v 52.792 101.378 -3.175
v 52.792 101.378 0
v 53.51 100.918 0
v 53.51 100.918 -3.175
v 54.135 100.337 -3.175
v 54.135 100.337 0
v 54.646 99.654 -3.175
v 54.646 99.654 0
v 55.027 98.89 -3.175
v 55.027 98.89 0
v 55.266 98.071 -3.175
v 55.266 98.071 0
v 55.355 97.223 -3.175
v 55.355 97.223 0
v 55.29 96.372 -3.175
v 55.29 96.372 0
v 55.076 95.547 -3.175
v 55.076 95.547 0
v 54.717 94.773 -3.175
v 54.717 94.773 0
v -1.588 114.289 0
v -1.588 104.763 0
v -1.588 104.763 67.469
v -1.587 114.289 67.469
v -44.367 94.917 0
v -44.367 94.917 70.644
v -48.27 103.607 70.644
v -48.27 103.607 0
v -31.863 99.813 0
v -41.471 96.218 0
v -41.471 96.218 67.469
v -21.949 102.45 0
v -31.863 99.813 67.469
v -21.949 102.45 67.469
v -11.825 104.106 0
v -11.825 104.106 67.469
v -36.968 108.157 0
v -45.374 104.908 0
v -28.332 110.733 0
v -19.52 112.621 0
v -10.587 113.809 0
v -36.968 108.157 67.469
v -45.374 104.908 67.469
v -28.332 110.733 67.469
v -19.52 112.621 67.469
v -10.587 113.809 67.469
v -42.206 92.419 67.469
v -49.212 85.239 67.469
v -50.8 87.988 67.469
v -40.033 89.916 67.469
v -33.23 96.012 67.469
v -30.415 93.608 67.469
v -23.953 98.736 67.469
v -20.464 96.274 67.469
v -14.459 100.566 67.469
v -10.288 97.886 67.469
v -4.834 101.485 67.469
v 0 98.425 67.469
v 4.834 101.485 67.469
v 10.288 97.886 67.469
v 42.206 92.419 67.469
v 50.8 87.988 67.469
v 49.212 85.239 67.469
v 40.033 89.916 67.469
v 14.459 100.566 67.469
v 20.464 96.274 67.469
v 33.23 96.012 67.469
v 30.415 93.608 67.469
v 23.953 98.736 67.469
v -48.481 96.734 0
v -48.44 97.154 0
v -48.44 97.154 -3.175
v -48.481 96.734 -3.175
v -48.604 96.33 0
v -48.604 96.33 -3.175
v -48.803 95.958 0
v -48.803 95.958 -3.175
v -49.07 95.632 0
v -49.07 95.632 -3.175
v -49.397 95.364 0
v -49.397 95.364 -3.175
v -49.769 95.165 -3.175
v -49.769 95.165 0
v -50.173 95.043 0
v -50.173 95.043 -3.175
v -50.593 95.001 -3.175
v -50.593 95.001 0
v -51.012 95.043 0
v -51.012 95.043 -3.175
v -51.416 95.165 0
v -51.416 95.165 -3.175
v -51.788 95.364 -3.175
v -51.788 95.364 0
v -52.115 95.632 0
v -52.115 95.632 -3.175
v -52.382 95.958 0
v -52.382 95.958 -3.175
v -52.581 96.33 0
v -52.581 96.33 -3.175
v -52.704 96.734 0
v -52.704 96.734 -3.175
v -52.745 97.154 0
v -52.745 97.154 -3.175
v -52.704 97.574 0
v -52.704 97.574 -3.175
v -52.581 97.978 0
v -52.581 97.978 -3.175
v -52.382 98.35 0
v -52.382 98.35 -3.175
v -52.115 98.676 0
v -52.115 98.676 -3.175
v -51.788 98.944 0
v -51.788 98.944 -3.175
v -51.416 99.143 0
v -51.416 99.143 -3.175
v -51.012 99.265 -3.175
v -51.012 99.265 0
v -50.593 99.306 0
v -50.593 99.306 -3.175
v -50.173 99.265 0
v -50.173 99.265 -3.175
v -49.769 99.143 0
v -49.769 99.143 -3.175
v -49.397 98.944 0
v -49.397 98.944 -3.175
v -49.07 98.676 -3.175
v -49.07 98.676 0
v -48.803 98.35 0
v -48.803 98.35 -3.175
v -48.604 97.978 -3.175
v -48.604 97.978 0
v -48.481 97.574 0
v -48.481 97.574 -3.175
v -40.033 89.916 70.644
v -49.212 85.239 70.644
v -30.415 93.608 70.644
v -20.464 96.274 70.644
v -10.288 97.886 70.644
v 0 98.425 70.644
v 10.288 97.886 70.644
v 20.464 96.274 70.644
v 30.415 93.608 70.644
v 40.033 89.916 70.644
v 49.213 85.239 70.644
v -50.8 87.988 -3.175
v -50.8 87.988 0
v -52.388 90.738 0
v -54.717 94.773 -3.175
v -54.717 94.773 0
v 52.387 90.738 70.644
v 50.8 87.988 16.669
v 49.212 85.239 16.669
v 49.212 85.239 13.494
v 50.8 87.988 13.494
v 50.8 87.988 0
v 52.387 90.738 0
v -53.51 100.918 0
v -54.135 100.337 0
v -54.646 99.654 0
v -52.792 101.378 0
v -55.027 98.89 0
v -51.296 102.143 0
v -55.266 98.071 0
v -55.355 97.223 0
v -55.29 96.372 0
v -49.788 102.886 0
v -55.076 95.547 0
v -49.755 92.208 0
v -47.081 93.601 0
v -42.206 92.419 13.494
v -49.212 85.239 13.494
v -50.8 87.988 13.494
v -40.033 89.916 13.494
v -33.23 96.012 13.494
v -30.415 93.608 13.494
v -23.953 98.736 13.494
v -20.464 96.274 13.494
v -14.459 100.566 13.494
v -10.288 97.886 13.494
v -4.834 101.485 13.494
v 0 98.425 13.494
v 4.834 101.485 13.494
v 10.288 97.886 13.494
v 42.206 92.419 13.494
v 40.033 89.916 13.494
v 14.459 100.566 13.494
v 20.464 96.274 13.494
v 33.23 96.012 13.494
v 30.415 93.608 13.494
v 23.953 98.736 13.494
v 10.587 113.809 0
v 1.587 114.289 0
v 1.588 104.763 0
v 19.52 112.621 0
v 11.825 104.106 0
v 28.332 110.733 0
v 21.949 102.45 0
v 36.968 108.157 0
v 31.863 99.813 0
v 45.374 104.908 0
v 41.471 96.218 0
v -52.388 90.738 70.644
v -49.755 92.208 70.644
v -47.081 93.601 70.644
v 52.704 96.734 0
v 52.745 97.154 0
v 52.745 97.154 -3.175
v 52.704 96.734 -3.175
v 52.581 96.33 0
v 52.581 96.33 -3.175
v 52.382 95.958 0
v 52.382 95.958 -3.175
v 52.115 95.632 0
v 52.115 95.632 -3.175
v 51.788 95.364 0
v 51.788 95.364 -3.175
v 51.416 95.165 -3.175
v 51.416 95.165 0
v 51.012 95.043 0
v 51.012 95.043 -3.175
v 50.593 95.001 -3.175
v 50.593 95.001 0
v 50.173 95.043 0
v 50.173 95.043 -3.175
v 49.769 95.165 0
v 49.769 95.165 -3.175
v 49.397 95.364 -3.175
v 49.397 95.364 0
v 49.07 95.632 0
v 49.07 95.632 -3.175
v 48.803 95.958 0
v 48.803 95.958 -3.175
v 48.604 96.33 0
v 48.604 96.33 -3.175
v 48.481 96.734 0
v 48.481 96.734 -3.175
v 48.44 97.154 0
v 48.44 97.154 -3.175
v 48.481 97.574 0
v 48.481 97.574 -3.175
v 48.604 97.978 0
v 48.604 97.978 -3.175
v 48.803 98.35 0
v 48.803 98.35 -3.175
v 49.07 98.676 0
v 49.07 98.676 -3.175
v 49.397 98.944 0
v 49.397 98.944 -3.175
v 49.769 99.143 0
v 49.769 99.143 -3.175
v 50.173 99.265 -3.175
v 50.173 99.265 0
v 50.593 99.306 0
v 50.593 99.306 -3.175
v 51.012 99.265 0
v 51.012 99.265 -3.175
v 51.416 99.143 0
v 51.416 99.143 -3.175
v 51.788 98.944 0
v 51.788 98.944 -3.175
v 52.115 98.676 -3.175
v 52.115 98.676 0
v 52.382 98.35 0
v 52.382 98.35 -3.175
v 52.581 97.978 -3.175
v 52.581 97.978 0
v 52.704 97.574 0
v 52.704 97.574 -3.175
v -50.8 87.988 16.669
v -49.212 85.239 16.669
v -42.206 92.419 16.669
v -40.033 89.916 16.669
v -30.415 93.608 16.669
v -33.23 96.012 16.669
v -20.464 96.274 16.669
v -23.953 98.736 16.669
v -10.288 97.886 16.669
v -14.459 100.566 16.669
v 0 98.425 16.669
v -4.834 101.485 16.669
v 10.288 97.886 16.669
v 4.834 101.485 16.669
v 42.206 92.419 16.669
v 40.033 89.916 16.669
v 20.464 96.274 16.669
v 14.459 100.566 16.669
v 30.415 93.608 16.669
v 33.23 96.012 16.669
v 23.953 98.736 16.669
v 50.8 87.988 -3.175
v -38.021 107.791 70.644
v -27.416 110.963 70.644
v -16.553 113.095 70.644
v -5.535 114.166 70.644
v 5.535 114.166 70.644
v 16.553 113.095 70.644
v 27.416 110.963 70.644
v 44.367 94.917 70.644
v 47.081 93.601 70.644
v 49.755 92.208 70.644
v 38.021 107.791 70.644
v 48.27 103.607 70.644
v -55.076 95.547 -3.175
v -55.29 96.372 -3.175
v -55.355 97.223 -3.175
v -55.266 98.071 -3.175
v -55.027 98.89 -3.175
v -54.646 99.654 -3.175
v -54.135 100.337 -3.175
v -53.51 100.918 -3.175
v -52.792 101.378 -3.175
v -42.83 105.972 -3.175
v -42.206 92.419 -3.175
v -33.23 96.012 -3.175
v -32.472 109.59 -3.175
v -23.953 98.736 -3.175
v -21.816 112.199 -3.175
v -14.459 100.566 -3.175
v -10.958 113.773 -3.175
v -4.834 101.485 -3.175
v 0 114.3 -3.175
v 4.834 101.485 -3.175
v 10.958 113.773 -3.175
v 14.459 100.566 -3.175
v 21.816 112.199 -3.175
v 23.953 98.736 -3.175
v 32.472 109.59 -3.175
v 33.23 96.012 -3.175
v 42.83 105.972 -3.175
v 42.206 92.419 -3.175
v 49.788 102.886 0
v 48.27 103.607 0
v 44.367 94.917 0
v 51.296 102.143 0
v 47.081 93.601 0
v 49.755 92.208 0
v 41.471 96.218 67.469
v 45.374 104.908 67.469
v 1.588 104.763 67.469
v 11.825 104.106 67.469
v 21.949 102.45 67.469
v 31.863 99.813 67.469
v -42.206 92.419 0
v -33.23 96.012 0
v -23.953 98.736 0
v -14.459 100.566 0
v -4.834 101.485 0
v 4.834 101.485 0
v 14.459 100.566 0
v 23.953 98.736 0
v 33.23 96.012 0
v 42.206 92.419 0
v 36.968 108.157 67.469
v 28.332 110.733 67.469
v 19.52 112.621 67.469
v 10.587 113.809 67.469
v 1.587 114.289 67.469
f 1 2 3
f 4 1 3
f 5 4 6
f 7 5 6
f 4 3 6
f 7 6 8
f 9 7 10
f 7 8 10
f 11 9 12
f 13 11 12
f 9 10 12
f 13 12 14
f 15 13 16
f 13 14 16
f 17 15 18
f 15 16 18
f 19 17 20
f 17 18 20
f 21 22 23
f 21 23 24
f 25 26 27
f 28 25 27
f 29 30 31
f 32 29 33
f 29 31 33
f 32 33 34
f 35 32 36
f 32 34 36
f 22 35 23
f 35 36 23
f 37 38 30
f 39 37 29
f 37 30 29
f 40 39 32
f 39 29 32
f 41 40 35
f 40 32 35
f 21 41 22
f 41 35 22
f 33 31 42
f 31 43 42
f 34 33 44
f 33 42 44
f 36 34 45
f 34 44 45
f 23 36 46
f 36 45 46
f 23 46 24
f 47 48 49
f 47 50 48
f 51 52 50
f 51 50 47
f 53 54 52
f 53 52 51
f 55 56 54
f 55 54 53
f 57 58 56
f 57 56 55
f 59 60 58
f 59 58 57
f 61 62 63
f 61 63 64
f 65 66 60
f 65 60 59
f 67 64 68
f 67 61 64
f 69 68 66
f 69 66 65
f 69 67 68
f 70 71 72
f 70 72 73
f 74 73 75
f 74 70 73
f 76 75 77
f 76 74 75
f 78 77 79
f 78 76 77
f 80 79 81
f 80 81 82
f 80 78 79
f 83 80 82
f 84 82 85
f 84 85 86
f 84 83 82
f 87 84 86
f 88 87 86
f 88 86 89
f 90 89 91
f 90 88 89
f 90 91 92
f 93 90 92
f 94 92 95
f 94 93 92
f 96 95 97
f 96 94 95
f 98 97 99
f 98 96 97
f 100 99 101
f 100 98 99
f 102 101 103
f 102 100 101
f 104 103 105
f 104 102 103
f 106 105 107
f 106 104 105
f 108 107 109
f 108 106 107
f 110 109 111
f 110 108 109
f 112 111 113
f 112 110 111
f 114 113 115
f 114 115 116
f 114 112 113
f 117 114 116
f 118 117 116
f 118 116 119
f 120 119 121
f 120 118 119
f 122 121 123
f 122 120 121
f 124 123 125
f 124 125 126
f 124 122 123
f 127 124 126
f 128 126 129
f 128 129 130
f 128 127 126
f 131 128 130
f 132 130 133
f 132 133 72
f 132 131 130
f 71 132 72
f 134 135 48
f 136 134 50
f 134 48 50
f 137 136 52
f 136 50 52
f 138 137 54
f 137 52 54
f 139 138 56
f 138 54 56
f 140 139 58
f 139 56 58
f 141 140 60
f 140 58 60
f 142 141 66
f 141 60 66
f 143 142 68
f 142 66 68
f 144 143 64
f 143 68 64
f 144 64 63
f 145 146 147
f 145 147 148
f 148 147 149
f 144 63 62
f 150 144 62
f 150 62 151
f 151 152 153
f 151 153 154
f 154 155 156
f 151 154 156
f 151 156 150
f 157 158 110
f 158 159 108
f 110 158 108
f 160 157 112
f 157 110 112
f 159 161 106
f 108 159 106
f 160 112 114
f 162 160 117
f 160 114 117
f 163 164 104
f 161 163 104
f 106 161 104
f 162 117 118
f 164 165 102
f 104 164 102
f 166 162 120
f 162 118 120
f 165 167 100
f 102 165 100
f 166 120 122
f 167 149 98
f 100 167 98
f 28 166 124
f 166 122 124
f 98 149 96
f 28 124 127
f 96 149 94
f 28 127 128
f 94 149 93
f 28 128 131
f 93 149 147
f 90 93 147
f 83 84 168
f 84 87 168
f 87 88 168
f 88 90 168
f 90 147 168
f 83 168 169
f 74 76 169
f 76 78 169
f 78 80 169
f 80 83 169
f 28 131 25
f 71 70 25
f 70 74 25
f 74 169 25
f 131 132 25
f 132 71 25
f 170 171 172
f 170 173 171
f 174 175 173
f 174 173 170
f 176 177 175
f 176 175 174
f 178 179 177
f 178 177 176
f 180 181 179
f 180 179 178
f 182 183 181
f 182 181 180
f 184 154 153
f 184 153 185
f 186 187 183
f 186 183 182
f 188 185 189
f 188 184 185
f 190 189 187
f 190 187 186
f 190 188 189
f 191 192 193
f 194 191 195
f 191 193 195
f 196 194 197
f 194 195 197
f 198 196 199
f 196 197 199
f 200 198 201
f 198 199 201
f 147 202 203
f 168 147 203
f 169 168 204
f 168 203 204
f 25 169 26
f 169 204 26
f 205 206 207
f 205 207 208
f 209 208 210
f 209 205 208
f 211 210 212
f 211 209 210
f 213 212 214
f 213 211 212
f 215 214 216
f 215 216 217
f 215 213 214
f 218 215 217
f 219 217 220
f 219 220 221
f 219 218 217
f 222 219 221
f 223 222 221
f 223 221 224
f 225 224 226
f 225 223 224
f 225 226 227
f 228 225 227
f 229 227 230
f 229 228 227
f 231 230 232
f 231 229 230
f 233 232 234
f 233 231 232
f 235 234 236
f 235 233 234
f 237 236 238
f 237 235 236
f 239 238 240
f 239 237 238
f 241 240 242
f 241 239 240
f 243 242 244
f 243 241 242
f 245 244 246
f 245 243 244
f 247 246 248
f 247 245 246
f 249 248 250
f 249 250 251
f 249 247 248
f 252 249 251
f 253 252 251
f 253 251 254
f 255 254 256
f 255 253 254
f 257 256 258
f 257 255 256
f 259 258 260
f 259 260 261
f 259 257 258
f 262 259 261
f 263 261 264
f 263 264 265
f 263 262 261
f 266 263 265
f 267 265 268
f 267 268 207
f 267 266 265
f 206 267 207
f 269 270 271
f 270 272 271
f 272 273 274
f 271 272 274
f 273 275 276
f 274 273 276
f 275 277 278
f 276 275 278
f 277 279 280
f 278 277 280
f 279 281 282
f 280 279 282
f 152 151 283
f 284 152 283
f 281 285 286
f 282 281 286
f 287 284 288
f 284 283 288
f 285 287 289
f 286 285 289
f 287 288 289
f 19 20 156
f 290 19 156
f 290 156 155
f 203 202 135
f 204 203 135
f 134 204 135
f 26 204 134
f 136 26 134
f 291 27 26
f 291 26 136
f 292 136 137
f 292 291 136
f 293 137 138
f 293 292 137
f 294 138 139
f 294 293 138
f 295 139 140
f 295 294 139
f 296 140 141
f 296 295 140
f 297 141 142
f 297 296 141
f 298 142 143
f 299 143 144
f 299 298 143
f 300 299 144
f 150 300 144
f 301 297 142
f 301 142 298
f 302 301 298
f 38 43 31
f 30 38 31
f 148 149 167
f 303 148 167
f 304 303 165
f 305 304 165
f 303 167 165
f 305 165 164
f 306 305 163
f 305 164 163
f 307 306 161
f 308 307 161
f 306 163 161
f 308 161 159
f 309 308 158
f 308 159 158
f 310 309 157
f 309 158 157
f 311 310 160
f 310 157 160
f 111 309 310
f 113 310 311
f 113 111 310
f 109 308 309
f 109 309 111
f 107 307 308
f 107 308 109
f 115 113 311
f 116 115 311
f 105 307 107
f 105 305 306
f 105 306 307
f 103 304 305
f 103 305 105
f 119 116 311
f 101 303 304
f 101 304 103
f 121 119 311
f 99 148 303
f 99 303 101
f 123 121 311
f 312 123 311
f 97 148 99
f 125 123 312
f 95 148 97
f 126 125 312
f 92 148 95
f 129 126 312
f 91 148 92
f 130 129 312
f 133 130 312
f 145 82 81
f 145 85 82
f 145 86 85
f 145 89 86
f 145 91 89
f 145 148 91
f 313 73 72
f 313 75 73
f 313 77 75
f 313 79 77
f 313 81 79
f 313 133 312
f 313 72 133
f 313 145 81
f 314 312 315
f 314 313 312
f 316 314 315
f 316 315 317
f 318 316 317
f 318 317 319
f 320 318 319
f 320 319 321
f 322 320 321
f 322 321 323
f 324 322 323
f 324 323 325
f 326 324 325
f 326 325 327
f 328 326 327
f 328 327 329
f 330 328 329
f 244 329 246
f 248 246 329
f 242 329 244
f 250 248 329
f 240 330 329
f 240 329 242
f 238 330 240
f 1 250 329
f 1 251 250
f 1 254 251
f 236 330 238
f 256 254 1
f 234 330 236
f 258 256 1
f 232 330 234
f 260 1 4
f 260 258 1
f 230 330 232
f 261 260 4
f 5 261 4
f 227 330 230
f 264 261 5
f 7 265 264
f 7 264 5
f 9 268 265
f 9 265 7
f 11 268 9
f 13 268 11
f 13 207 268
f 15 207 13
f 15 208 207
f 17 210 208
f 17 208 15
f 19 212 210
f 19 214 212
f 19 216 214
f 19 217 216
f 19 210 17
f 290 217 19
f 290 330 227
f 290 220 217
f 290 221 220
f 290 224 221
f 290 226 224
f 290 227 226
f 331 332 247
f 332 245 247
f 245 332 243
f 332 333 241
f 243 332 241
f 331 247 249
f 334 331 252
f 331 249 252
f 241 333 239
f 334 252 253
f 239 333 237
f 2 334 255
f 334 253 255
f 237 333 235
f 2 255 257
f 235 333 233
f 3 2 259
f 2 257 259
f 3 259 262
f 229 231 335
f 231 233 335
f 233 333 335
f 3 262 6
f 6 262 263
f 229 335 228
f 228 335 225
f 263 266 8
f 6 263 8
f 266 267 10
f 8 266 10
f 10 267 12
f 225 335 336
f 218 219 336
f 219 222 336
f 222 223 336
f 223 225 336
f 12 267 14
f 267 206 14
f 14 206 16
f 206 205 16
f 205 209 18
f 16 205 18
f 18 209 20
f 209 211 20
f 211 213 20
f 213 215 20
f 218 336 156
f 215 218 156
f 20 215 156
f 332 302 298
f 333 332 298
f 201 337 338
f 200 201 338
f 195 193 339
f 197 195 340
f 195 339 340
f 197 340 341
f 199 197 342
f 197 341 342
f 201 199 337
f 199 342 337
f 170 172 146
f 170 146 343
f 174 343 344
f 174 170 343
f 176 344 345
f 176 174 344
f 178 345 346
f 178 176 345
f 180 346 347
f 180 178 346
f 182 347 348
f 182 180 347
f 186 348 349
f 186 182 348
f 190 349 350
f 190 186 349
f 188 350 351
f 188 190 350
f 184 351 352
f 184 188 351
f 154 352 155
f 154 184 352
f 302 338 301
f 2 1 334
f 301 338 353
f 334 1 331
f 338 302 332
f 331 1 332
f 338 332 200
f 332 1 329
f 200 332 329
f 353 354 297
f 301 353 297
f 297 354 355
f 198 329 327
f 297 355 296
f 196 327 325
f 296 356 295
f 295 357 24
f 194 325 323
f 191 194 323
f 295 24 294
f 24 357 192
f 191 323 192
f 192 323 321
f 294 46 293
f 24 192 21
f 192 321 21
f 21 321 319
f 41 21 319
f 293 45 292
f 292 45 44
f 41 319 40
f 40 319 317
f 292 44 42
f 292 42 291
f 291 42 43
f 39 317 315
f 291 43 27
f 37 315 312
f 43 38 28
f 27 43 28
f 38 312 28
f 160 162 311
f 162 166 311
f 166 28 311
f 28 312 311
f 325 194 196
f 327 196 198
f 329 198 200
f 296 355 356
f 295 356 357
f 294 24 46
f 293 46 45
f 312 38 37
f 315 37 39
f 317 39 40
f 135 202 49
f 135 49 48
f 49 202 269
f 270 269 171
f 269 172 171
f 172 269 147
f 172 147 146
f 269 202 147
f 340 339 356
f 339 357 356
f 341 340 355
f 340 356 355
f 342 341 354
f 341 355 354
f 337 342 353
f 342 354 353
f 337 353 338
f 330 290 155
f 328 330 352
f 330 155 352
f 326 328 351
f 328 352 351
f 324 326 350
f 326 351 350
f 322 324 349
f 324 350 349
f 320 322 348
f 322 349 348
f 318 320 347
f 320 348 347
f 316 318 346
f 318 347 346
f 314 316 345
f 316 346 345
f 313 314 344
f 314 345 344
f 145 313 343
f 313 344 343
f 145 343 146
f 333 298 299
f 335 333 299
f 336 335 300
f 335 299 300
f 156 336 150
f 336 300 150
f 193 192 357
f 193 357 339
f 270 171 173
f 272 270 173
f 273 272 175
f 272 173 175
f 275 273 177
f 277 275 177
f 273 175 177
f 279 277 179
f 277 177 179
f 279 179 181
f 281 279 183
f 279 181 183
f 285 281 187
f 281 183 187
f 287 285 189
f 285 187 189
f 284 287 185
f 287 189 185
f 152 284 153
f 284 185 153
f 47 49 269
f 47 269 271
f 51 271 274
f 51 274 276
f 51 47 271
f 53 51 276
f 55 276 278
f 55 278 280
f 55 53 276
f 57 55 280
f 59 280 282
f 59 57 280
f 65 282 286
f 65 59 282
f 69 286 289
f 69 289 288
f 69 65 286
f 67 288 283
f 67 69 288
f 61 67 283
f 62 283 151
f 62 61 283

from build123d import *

# Parameters (mm, degrees)
F1_DEPTH = 70.64375
F2_W     = 3.175
F2_H     = 50.8
F2_H_2   = 13.49375
F5_DEPTH = 70.64375
F6_R     = 2.15265
F7_DEPTH = 3.175
F9_DEPTH = 3.175


with BuildPart() as f1:
    # F0 (on Top) → F1 (new body)
    with BuildSketch(Plane.XY):
        with BuildLine():
            ThreePointArc((-49.2125, 85.2385503675), (0, 98.425), (49.2125, 85.2385503675))
            Line((49.2125, 85.2385503675), (57.15, 98.9867036526))
            ThreePointArc((57.15, 98.9867036526), (0, 114.3), (-57.15, 98.9867036526))
            Line((-57.15, 98.9867036526), (-49.2125, 85.2385503675))
        make_face()
    extrude(amount=F1_DEPTH)

    # F2 (on face) → F3 (revolve, cut)
    with BuildSketch(Plane(origin=(0, 0, 0), x_dir=(0.5, -0.8660254038, 0), z_dir=(-0.8660254038, -0.5, 0))):
        with Locations((-100.0125, 42.06875)):
            Rectangle(F2_W, F2_H)
        with Locations((-100.0125, 6.746875)):
            Rectangle(F2_W, F2_H_2)
    revolve(axis=Axis((0, 0, 0), (0, 0, -1)), mode=Mode.SUBTRACT)

    # F4 (on face) → F5 (cut, through all)
    with BuildSketch(Plane.XY.offset(70.64375)):
        with BuildLine():
            ThreePointArc((-48.2700740152, 103.6073836875), (-52.7606451092, 101.3943012583), (-57.15, 98.9867036526))
            Line((-57.15, 98.9867036526), (-52.3875, 90.7378116815))
            ThreePointArc((-52.3875, 90.7378116815), (-48.4225984878, 92.9142216277), (-44.3674611423, 94.9174853059))
            Line((-44.3674611423, 94.9174853059), (-48.2700740152, 103.6073836875))
        make_face()
        with BuildLine():
            Line((-45.3737460178, 104.9081177617), (-41.4711331449, 96.2182193801))
            ThreePointArc((-41.4711331449, 96.2182193801), (-21.9491383614, 102.4501632512), (-1.5875, 104.7629727945))
            Line((-1.5875, 104.7629727945), (-1.5875, 114.2889751627))
            ThreePointArc((-1.5875, 114.2889751627), (-23.944514576, 111.7638144558), (-45.3737460178, 104.9081177617))
        make_face()
        with BuildLine():
            Line((1.5875, 114.2889751627), (1.5875, 104.7629727945))
            ThreePointArc((1.5875, 104.7629727945), (21.9491383614, 102.4501632512), (41.4711331449, 96.2182193801))
            Line((41.4711331449, 96.2182193801), (45.3737460178, 104.9081177617))
            ThreePointArc((45.3737460178, 104.9081177617), (23.944514576, 111.7638144558), (1.5875, 114.2889751627))
        make_face()
        with BuildLine():
            ThreePointArc((44.3674611423, 94.9174853059), (48.4225984878, 92.9142216277), (52.3875, 90.7378116815))
            Line((52.3875, 90.7378116815), (57.15, 98.9867036526))
            ThreePointArc((57.15, 98.9867036526), (52.7606451092, 101.3943012583), (48.2700740152, 103.6073836875))
            Line((48.2700740152, 103.6073836875), (44.3674611423, 94.9174853059))
        make_face()
    extrude(amount=-F5_DEPTH, mode=Mode.SUBTRACT)

    # F6 (on face) → F7 (join)
    with BuildSketch(Plane(origin=(0, 0, 0), x_dir=(1, 0, 0), z_dir=(0, 0, -1))):
        with BuildLine():
            ThreePointArc((50.8, -87.9881810245), (0, -101.6), (-50.8, -87.9881810245))
            Line((-50.8, -87.9881810245), (-54.7169592083, -94.7725533844))
            ThreePointArc((-54.7169592083, -94.7725533844), (-55.1648447708, -98.4861661221), (-52.7921877107, -101.3778817924))
            ThreePointArc((-52.7921877107, -101.3778817924), (0, -114.3), (52.7921877107, -101.3778817924))
            ThreePointArc((52.7921877107, -101.3778817924), (55.1648447708, -98.4861661221), (54.7169592083, -94.7725533844))
            Line((54.7169592083, -94.7725533844), (50.8, -87.9881810245))
        make_face()
        with Locations((-50.5925132228, -97.1538033844)):
            Circle(F6_R, mode=Mode.SUBTRACT)
        with Locations((50.5925132228, -97.1538033844)):
            Circle(F6_R, mode=Mode.SUBTRACT)
    extrude(amount=F7_DEPTH)

    # F8 (on face) → F9 (join)
    with BuildSketch(Plane.XY.offset(70.64375)):
        with BuildLine():
            Line((44.3674611423, 94.9174853059), (48.2700740152, 103.6073836875))
            ThreePointArc((48.2700740152, 103.6073836875), (0, 114.3), (-48.2700740152, 103.6073836875))
            Line((-48.2700740152, 103.6073836875), (-44.3674611423, 94.9174853059))
            ThreePointArc((-44.3674611423, 94.9174853059), (0, 104.775), (44.3674611423, 94.9174853059))
        make_face()
    extrude(amount=-F9_DEPTH)


solid = f1.part
